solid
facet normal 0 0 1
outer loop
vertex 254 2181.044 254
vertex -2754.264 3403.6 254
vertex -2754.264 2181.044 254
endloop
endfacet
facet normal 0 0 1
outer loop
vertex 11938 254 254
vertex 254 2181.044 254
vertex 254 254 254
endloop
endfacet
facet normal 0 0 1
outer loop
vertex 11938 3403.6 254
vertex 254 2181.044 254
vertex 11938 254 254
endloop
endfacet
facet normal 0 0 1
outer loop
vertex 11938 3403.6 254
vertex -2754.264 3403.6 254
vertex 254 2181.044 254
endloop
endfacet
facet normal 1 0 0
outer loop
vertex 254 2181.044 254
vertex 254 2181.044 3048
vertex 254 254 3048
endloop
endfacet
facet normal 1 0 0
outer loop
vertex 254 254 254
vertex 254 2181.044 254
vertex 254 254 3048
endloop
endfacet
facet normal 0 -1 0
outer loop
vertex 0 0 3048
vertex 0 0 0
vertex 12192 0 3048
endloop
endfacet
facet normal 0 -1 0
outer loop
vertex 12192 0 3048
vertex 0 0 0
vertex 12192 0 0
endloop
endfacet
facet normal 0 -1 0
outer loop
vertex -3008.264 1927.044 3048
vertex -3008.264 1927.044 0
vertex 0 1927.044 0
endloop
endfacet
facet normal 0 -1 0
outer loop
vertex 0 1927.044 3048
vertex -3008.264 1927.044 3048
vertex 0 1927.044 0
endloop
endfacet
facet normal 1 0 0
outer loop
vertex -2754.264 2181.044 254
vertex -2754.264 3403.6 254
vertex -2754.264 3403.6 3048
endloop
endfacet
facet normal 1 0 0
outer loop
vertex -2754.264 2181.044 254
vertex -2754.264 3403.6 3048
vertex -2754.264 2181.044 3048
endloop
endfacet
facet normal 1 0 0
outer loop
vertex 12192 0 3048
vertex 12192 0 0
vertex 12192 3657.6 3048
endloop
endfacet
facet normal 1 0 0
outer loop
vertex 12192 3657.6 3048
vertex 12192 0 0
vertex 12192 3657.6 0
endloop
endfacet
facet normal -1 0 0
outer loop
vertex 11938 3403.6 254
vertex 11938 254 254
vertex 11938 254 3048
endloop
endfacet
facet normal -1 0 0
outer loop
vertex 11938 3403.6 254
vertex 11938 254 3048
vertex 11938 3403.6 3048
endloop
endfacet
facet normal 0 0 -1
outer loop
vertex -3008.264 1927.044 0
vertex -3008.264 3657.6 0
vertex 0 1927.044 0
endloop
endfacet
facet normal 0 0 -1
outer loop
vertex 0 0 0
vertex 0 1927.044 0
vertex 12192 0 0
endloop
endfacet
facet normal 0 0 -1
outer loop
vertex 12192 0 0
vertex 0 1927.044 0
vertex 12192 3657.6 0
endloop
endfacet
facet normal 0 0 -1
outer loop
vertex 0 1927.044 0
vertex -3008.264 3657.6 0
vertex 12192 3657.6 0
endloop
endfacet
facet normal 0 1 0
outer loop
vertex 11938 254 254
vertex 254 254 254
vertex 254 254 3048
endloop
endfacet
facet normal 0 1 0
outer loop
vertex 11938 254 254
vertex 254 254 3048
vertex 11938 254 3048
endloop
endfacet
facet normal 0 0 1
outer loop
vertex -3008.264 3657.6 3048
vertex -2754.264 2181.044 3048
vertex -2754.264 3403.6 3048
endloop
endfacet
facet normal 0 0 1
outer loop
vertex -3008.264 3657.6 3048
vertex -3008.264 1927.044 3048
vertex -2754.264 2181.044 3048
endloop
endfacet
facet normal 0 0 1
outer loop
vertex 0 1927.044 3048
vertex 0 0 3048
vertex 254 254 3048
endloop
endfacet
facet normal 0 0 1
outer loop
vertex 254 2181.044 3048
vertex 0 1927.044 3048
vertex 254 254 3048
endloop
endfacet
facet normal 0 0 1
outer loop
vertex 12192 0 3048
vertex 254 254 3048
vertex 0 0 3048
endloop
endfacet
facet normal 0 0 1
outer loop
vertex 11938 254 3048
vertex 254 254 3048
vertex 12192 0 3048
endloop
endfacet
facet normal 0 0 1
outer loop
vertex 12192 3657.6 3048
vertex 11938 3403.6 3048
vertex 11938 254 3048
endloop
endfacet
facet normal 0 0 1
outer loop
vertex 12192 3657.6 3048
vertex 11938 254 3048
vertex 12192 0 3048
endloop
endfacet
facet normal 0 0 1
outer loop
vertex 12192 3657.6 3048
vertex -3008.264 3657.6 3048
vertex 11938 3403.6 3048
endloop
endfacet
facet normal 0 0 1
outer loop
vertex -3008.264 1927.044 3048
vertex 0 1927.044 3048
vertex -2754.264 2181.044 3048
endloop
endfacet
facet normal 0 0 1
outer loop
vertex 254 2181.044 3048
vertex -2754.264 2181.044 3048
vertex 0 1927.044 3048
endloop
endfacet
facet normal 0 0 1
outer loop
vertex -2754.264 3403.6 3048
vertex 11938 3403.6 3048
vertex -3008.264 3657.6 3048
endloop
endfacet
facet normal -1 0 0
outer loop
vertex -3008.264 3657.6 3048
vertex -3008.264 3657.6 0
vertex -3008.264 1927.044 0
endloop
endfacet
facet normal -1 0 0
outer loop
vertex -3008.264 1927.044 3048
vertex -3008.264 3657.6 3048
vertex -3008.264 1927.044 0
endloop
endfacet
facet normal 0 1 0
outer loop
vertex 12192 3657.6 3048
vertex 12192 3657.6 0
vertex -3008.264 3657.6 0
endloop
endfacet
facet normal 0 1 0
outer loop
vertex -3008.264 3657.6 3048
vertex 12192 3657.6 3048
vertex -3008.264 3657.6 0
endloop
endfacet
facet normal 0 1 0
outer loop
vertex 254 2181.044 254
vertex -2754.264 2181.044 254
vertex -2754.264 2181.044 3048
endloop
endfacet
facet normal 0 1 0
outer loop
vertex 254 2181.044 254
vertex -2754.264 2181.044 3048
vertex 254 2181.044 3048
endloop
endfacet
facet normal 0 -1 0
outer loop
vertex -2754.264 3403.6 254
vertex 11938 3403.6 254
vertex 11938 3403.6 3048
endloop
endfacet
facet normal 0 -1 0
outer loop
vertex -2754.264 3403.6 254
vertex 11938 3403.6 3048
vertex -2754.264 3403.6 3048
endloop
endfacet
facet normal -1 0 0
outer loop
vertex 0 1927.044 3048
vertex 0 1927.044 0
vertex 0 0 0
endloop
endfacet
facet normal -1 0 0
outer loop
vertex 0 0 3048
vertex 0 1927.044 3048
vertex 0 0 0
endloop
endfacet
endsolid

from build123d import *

# Parameters (mm, degrees)
F1_DEPTH = 3048
F2_T     = -254


with BuildPart() as f1:
    # F0 (on Top) → F1 (new body)
    with BuildSketch(Plane.XY):
        Polygon((0, 1927.0439147949), (0, 0), (12192, 0), (12192, 3657.6), (-3008.2641230267, 3657.6), (-3008.2641230267, 1927.0439147949), align=None)
    extrude(amount=F1_DEPTH)

    # F2
    f2_openings = [f1.faces().sort_by_distance(p)[0] for p in [
        (5301.491736, 1929.525376, 3048),
    ]]
    offset(amount=F2_T, openings=f2_openings, kind=Kind.INTERSECTION)


solid = f1.part
